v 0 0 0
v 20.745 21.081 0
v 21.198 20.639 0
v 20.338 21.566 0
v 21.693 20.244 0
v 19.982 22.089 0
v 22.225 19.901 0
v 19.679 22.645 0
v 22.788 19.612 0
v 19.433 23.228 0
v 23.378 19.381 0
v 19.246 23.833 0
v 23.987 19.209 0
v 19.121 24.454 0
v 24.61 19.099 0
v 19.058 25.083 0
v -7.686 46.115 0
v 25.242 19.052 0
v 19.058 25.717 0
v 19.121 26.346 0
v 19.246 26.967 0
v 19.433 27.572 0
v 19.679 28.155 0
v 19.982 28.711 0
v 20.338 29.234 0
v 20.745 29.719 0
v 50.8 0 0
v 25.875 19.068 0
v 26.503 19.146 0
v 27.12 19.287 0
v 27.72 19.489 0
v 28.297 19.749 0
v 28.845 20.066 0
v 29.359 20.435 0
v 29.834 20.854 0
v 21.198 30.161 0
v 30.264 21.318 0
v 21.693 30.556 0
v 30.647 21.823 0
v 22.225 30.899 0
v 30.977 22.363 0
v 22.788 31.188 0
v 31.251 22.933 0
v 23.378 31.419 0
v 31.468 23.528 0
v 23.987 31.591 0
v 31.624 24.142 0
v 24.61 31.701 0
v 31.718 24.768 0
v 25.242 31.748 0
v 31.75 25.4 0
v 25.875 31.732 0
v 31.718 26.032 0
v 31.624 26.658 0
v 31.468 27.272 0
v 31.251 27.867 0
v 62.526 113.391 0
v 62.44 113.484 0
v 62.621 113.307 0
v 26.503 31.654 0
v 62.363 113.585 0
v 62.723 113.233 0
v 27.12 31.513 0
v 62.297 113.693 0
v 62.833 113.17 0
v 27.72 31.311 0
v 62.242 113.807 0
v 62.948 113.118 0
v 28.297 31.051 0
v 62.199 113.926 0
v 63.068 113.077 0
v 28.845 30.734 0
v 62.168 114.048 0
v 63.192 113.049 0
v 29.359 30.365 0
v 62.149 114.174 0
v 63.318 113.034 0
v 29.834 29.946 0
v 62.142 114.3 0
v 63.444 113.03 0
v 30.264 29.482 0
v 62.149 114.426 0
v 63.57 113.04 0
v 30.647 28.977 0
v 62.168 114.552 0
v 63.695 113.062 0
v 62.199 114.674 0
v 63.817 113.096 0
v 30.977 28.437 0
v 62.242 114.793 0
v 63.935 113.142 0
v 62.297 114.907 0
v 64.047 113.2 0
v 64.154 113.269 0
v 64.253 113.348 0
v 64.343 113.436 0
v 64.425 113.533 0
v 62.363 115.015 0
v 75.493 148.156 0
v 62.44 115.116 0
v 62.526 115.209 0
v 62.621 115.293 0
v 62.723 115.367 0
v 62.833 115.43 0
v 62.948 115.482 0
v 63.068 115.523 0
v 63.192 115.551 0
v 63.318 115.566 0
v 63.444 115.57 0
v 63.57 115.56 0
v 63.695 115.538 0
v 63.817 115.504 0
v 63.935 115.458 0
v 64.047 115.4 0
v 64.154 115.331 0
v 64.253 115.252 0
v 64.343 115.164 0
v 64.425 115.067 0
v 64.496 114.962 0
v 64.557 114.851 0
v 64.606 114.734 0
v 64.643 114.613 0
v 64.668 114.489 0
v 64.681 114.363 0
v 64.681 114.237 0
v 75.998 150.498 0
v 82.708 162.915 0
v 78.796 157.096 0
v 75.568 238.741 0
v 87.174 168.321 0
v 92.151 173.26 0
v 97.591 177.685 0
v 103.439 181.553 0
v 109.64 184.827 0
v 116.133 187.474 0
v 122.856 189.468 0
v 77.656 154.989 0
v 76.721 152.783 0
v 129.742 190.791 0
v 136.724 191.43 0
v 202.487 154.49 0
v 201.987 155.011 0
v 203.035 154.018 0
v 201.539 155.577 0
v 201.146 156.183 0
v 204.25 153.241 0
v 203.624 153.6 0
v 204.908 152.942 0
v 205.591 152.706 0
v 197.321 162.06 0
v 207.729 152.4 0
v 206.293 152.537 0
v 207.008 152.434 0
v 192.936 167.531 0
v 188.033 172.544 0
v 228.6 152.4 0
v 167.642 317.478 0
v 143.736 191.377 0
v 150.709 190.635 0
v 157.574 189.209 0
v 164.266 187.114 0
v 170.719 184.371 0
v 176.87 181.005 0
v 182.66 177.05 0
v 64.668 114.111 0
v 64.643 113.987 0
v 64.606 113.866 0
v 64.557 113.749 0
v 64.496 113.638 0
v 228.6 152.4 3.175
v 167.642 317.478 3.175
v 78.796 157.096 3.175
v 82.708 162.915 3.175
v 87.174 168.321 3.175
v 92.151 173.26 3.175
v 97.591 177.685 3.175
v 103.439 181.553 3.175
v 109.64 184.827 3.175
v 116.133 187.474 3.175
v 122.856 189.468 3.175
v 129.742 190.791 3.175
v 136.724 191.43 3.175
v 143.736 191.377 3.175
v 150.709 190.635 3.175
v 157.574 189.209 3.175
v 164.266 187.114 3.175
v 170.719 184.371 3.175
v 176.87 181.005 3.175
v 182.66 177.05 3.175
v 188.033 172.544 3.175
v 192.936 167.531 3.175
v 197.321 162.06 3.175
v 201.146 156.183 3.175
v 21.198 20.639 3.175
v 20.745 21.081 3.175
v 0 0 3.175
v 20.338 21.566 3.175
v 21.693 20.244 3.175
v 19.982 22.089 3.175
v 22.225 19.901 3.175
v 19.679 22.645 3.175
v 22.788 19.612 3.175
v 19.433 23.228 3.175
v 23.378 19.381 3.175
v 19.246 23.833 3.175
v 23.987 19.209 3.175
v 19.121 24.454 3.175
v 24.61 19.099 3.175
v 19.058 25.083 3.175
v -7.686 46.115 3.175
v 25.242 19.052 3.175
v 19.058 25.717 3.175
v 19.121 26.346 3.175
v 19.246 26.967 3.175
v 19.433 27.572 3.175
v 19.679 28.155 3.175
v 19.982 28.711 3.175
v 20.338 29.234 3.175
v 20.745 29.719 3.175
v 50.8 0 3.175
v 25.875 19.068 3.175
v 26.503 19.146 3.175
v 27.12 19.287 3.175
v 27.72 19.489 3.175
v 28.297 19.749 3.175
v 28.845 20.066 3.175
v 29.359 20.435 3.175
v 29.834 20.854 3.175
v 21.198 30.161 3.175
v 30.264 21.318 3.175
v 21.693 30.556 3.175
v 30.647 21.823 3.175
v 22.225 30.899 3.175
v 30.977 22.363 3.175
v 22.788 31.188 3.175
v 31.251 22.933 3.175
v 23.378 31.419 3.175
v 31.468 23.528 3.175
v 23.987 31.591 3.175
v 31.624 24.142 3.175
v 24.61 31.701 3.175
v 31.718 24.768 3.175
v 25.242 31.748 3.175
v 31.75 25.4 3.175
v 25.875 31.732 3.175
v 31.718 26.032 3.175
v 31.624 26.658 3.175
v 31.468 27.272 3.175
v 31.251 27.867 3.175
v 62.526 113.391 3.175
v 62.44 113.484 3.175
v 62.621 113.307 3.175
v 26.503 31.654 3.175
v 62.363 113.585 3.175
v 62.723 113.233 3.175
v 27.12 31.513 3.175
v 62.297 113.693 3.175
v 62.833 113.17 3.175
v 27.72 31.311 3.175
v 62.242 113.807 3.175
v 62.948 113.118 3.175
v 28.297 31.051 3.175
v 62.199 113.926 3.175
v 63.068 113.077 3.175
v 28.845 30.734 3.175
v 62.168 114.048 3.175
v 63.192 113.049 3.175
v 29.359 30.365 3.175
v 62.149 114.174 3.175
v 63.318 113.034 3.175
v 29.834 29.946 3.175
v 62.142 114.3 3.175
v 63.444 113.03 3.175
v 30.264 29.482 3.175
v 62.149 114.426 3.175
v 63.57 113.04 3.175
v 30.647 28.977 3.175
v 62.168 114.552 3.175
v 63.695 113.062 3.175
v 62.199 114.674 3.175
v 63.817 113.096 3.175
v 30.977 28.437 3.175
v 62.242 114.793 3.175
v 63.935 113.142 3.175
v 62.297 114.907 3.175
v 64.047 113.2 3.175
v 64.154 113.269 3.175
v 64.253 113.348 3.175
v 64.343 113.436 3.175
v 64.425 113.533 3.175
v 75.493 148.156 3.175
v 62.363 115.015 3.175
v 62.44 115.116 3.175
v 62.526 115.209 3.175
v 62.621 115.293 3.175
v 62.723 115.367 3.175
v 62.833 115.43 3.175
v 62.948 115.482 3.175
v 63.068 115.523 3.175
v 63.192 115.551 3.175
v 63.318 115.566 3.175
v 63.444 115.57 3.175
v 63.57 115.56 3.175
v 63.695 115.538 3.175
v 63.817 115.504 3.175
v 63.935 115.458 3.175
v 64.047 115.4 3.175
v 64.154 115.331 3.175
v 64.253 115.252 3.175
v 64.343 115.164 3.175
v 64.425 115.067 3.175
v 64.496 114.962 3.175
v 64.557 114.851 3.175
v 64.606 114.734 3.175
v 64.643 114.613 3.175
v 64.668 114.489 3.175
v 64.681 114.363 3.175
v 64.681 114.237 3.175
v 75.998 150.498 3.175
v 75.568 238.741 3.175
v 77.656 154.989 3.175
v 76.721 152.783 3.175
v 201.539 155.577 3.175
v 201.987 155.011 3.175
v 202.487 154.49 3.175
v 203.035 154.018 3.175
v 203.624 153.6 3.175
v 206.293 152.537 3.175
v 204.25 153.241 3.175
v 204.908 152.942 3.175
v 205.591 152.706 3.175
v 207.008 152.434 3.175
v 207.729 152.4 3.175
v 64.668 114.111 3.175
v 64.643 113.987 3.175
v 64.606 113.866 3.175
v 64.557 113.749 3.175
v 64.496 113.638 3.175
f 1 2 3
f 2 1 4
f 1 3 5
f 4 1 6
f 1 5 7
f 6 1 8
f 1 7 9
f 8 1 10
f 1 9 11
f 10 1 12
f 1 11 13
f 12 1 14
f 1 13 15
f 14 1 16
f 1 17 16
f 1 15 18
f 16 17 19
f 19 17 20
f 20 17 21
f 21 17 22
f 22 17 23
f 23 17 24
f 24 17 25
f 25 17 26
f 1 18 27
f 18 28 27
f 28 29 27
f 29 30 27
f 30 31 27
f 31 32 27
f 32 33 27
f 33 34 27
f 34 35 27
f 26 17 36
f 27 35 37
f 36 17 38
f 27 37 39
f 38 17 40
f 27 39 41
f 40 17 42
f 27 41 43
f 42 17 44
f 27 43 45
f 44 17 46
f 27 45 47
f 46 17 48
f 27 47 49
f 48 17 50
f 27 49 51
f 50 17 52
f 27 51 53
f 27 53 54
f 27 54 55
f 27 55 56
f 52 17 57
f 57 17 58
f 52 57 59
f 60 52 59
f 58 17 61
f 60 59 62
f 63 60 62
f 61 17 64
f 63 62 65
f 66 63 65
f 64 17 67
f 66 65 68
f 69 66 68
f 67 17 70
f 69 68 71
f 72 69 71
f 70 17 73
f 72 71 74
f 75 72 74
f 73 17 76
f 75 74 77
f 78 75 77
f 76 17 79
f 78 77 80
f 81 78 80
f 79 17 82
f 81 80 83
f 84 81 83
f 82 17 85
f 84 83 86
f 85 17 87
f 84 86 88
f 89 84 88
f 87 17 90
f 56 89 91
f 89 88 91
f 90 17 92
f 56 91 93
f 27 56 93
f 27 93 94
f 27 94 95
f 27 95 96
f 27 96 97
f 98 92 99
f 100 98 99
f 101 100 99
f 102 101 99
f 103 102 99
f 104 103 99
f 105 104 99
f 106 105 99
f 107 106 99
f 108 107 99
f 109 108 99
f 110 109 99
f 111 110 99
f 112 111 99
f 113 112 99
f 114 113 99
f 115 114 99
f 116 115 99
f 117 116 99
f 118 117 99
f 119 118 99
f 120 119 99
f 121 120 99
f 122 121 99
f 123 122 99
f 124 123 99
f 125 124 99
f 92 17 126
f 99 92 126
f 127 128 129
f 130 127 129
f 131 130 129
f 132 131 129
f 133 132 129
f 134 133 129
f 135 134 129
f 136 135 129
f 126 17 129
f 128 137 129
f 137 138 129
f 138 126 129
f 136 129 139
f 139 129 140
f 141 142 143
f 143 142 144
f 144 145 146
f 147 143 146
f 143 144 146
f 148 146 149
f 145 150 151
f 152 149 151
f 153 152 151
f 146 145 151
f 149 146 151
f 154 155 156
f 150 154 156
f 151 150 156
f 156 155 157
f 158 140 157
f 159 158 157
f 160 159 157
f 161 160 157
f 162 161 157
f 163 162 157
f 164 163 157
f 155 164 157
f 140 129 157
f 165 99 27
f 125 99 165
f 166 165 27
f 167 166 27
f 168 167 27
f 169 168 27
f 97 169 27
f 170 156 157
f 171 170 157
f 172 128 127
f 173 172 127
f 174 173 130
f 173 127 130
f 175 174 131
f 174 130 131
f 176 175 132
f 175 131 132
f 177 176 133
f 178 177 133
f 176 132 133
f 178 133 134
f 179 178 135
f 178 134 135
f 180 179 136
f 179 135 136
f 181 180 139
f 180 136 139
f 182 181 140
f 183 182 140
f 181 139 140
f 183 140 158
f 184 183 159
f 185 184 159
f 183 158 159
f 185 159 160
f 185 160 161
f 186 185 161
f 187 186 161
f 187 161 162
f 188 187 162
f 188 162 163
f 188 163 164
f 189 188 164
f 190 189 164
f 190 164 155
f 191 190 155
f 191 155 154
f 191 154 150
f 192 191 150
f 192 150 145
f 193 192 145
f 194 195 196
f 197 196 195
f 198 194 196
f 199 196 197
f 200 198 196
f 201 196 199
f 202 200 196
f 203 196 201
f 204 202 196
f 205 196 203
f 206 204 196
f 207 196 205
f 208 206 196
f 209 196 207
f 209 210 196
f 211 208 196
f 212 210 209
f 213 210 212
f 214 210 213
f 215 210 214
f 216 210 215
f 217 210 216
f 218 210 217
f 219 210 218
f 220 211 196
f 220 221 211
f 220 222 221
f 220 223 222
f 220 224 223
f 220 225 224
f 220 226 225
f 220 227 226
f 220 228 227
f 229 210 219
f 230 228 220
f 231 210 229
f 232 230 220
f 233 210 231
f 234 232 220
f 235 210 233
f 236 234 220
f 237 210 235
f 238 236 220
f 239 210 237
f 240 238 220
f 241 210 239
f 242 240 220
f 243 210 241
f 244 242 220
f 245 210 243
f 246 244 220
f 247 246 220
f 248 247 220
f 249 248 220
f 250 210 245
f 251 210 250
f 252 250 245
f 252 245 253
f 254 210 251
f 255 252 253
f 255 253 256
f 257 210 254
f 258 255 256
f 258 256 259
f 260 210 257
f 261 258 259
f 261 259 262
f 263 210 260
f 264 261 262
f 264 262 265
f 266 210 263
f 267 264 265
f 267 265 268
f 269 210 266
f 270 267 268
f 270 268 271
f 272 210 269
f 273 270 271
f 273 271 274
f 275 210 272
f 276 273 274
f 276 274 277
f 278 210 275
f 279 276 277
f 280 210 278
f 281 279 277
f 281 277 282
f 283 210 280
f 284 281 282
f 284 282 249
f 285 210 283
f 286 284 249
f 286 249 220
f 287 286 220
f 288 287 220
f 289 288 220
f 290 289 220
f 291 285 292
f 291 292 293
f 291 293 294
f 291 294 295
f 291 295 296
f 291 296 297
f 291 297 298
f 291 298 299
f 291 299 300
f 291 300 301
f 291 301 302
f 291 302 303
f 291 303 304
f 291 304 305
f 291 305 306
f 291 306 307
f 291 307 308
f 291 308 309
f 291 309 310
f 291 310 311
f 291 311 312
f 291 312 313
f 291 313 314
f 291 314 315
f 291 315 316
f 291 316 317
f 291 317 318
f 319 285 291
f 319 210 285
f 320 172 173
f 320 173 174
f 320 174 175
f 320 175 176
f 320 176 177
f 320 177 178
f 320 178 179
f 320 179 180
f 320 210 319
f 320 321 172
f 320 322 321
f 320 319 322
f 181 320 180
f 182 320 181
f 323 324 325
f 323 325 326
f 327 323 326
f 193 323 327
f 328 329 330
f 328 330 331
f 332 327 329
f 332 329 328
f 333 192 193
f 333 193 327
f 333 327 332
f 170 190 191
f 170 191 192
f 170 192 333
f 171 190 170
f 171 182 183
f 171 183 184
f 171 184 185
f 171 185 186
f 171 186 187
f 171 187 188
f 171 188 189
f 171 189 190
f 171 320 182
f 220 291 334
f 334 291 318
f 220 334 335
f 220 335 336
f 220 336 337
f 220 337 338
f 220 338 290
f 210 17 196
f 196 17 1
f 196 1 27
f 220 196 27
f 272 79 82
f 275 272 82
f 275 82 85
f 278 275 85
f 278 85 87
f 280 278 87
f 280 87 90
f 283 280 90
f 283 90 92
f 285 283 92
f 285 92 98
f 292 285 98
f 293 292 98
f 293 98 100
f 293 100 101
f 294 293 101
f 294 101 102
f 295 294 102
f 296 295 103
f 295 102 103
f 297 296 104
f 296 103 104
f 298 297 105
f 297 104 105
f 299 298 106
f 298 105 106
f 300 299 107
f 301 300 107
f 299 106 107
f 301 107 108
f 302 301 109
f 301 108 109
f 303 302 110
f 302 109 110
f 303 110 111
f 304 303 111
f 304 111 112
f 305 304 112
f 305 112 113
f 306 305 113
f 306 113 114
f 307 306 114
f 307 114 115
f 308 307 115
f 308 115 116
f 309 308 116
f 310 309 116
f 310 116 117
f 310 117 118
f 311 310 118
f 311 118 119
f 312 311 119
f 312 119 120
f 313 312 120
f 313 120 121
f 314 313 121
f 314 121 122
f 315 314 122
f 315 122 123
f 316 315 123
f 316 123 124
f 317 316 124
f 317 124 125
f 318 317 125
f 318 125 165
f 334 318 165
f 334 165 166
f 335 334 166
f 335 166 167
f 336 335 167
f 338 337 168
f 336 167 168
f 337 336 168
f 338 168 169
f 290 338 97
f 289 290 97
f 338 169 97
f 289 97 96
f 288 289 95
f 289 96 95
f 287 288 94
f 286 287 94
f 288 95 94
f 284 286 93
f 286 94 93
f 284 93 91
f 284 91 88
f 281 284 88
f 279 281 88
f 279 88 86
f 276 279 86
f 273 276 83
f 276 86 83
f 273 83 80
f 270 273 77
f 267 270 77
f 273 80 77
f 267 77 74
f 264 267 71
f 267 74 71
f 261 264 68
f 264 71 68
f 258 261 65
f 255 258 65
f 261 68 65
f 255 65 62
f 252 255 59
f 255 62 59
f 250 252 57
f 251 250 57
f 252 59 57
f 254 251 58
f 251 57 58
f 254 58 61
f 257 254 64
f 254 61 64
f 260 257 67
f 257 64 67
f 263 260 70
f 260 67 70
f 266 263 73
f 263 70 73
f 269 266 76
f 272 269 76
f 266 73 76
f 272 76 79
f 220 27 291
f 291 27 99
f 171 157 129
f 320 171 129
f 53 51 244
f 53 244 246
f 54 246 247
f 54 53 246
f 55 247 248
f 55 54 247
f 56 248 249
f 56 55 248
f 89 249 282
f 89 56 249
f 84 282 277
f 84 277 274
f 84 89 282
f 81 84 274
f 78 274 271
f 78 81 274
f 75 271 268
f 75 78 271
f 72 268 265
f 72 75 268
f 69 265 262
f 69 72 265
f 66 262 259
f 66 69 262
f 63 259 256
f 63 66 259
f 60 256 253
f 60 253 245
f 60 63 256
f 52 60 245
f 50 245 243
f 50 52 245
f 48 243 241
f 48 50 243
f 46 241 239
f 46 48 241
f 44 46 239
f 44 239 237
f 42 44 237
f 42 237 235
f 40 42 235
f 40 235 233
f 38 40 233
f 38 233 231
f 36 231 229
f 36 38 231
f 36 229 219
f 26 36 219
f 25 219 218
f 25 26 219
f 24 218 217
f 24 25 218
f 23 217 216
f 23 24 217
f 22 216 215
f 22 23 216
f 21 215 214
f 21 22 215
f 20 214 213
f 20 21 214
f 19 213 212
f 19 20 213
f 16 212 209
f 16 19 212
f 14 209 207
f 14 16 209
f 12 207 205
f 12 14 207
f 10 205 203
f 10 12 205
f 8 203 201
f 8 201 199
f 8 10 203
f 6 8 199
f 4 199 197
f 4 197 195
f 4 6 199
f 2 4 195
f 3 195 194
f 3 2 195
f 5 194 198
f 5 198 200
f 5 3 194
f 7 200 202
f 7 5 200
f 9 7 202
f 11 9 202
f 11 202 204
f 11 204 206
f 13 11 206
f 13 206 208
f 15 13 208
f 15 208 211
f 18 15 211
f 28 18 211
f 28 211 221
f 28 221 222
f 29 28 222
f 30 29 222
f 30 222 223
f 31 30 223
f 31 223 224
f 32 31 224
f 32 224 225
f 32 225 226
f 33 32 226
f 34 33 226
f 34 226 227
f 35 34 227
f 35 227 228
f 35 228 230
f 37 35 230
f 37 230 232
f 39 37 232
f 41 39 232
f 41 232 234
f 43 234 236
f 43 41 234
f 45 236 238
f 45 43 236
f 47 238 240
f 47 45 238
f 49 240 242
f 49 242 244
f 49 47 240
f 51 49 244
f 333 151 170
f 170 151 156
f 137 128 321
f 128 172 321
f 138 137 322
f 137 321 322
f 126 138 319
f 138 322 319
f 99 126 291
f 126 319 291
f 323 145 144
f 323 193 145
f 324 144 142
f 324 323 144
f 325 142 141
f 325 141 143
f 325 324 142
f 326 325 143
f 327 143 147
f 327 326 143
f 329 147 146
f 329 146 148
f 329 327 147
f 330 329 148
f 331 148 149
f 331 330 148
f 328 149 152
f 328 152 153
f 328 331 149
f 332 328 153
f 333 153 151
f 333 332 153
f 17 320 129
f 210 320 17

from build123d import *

# Parameters (mm, degrees)
SKETCH1_R           = 6.35
BOSS_EXTRUDE1_DEPTH = 3.175
CUT_EXTRUDE3_DEPTH  = 392.229140513
FILLET1_R           = 7.62
FILLET4_R           = 25.4
SKETCH5_R           = 1.27
CUT_EXTRUDE4_DEPTH  = 392.229140513


with BuildPart() as part:
    # Sketch1 → Boss-Extrude1 (new body)
    with BuildSketch(Plane.XY):
        with BuildLine():
            Line((0, 0), (50.8, 0))
            Line((50.8, 0), (76.2, 152.4))
            ThreePointArc((76.2, 152.4), (139.7, 191.491818659), (203.2, 152.4))
            Line((203.2, 152.4), (228.6, 152.4))
            Line((228.6, 152.4), (167.642212713, 317.477872869))
            Line((167.642212713, 317.477872869), (-25.4, 152.4))
            Line((-25.4, 152.4), (0, 0))
        make_face()
        with Locations((25.4, 25.4)):
            Circle(SKETCH1_R, mode=Mode.SUBTRACT)
    extrude(amount=BOSS_EXTRUDE1_DEPTH)

    # Sketch4 → Cut-Extrude3 (cut, through all)
    with BuildSketch(Plane.XY.offset(3.175)):
        Polygon((86.239354079, 263.432711485), (-16.185204596, 26.450399258), (-107.229256751, 193.810789249), align=None)
    extrude(amount=-CUT_EXTRUDE3_DEPTH, mode=Mode.SUBTRACT)

    # Fillet1
    fillet1_edges = [part.edges().sort_by_distance(p)[0] for p in [
        (203.2, 152.4, 1.5875),
    ]]
    fillet(fillet1_edges, radius=FILLET1_R)

    # Fillet4
    fillet4_edges = [part.edges().sort_by_distance(p)[0] for p in [
        (76.2, 152.4, 1.5875),
    ]]
    fillet(fillet4_edges, radius=FILLET4_R)

    # Sketch5 → Cut-Extrude4 (cut, through all)
    with BuildSketch(Plane(origin=(0, 0, 0), x_dir=(-1, 0, 0), z_dir=(0, 0, -1))):
        with Locations((-63.412409655, 114.3)):
            Circle(SKETCH5_R)
    extrude(amount=-CUT_EXTRUDE4_DEPTH, mode=Mode.SUBTRACT)


solid = part.part
